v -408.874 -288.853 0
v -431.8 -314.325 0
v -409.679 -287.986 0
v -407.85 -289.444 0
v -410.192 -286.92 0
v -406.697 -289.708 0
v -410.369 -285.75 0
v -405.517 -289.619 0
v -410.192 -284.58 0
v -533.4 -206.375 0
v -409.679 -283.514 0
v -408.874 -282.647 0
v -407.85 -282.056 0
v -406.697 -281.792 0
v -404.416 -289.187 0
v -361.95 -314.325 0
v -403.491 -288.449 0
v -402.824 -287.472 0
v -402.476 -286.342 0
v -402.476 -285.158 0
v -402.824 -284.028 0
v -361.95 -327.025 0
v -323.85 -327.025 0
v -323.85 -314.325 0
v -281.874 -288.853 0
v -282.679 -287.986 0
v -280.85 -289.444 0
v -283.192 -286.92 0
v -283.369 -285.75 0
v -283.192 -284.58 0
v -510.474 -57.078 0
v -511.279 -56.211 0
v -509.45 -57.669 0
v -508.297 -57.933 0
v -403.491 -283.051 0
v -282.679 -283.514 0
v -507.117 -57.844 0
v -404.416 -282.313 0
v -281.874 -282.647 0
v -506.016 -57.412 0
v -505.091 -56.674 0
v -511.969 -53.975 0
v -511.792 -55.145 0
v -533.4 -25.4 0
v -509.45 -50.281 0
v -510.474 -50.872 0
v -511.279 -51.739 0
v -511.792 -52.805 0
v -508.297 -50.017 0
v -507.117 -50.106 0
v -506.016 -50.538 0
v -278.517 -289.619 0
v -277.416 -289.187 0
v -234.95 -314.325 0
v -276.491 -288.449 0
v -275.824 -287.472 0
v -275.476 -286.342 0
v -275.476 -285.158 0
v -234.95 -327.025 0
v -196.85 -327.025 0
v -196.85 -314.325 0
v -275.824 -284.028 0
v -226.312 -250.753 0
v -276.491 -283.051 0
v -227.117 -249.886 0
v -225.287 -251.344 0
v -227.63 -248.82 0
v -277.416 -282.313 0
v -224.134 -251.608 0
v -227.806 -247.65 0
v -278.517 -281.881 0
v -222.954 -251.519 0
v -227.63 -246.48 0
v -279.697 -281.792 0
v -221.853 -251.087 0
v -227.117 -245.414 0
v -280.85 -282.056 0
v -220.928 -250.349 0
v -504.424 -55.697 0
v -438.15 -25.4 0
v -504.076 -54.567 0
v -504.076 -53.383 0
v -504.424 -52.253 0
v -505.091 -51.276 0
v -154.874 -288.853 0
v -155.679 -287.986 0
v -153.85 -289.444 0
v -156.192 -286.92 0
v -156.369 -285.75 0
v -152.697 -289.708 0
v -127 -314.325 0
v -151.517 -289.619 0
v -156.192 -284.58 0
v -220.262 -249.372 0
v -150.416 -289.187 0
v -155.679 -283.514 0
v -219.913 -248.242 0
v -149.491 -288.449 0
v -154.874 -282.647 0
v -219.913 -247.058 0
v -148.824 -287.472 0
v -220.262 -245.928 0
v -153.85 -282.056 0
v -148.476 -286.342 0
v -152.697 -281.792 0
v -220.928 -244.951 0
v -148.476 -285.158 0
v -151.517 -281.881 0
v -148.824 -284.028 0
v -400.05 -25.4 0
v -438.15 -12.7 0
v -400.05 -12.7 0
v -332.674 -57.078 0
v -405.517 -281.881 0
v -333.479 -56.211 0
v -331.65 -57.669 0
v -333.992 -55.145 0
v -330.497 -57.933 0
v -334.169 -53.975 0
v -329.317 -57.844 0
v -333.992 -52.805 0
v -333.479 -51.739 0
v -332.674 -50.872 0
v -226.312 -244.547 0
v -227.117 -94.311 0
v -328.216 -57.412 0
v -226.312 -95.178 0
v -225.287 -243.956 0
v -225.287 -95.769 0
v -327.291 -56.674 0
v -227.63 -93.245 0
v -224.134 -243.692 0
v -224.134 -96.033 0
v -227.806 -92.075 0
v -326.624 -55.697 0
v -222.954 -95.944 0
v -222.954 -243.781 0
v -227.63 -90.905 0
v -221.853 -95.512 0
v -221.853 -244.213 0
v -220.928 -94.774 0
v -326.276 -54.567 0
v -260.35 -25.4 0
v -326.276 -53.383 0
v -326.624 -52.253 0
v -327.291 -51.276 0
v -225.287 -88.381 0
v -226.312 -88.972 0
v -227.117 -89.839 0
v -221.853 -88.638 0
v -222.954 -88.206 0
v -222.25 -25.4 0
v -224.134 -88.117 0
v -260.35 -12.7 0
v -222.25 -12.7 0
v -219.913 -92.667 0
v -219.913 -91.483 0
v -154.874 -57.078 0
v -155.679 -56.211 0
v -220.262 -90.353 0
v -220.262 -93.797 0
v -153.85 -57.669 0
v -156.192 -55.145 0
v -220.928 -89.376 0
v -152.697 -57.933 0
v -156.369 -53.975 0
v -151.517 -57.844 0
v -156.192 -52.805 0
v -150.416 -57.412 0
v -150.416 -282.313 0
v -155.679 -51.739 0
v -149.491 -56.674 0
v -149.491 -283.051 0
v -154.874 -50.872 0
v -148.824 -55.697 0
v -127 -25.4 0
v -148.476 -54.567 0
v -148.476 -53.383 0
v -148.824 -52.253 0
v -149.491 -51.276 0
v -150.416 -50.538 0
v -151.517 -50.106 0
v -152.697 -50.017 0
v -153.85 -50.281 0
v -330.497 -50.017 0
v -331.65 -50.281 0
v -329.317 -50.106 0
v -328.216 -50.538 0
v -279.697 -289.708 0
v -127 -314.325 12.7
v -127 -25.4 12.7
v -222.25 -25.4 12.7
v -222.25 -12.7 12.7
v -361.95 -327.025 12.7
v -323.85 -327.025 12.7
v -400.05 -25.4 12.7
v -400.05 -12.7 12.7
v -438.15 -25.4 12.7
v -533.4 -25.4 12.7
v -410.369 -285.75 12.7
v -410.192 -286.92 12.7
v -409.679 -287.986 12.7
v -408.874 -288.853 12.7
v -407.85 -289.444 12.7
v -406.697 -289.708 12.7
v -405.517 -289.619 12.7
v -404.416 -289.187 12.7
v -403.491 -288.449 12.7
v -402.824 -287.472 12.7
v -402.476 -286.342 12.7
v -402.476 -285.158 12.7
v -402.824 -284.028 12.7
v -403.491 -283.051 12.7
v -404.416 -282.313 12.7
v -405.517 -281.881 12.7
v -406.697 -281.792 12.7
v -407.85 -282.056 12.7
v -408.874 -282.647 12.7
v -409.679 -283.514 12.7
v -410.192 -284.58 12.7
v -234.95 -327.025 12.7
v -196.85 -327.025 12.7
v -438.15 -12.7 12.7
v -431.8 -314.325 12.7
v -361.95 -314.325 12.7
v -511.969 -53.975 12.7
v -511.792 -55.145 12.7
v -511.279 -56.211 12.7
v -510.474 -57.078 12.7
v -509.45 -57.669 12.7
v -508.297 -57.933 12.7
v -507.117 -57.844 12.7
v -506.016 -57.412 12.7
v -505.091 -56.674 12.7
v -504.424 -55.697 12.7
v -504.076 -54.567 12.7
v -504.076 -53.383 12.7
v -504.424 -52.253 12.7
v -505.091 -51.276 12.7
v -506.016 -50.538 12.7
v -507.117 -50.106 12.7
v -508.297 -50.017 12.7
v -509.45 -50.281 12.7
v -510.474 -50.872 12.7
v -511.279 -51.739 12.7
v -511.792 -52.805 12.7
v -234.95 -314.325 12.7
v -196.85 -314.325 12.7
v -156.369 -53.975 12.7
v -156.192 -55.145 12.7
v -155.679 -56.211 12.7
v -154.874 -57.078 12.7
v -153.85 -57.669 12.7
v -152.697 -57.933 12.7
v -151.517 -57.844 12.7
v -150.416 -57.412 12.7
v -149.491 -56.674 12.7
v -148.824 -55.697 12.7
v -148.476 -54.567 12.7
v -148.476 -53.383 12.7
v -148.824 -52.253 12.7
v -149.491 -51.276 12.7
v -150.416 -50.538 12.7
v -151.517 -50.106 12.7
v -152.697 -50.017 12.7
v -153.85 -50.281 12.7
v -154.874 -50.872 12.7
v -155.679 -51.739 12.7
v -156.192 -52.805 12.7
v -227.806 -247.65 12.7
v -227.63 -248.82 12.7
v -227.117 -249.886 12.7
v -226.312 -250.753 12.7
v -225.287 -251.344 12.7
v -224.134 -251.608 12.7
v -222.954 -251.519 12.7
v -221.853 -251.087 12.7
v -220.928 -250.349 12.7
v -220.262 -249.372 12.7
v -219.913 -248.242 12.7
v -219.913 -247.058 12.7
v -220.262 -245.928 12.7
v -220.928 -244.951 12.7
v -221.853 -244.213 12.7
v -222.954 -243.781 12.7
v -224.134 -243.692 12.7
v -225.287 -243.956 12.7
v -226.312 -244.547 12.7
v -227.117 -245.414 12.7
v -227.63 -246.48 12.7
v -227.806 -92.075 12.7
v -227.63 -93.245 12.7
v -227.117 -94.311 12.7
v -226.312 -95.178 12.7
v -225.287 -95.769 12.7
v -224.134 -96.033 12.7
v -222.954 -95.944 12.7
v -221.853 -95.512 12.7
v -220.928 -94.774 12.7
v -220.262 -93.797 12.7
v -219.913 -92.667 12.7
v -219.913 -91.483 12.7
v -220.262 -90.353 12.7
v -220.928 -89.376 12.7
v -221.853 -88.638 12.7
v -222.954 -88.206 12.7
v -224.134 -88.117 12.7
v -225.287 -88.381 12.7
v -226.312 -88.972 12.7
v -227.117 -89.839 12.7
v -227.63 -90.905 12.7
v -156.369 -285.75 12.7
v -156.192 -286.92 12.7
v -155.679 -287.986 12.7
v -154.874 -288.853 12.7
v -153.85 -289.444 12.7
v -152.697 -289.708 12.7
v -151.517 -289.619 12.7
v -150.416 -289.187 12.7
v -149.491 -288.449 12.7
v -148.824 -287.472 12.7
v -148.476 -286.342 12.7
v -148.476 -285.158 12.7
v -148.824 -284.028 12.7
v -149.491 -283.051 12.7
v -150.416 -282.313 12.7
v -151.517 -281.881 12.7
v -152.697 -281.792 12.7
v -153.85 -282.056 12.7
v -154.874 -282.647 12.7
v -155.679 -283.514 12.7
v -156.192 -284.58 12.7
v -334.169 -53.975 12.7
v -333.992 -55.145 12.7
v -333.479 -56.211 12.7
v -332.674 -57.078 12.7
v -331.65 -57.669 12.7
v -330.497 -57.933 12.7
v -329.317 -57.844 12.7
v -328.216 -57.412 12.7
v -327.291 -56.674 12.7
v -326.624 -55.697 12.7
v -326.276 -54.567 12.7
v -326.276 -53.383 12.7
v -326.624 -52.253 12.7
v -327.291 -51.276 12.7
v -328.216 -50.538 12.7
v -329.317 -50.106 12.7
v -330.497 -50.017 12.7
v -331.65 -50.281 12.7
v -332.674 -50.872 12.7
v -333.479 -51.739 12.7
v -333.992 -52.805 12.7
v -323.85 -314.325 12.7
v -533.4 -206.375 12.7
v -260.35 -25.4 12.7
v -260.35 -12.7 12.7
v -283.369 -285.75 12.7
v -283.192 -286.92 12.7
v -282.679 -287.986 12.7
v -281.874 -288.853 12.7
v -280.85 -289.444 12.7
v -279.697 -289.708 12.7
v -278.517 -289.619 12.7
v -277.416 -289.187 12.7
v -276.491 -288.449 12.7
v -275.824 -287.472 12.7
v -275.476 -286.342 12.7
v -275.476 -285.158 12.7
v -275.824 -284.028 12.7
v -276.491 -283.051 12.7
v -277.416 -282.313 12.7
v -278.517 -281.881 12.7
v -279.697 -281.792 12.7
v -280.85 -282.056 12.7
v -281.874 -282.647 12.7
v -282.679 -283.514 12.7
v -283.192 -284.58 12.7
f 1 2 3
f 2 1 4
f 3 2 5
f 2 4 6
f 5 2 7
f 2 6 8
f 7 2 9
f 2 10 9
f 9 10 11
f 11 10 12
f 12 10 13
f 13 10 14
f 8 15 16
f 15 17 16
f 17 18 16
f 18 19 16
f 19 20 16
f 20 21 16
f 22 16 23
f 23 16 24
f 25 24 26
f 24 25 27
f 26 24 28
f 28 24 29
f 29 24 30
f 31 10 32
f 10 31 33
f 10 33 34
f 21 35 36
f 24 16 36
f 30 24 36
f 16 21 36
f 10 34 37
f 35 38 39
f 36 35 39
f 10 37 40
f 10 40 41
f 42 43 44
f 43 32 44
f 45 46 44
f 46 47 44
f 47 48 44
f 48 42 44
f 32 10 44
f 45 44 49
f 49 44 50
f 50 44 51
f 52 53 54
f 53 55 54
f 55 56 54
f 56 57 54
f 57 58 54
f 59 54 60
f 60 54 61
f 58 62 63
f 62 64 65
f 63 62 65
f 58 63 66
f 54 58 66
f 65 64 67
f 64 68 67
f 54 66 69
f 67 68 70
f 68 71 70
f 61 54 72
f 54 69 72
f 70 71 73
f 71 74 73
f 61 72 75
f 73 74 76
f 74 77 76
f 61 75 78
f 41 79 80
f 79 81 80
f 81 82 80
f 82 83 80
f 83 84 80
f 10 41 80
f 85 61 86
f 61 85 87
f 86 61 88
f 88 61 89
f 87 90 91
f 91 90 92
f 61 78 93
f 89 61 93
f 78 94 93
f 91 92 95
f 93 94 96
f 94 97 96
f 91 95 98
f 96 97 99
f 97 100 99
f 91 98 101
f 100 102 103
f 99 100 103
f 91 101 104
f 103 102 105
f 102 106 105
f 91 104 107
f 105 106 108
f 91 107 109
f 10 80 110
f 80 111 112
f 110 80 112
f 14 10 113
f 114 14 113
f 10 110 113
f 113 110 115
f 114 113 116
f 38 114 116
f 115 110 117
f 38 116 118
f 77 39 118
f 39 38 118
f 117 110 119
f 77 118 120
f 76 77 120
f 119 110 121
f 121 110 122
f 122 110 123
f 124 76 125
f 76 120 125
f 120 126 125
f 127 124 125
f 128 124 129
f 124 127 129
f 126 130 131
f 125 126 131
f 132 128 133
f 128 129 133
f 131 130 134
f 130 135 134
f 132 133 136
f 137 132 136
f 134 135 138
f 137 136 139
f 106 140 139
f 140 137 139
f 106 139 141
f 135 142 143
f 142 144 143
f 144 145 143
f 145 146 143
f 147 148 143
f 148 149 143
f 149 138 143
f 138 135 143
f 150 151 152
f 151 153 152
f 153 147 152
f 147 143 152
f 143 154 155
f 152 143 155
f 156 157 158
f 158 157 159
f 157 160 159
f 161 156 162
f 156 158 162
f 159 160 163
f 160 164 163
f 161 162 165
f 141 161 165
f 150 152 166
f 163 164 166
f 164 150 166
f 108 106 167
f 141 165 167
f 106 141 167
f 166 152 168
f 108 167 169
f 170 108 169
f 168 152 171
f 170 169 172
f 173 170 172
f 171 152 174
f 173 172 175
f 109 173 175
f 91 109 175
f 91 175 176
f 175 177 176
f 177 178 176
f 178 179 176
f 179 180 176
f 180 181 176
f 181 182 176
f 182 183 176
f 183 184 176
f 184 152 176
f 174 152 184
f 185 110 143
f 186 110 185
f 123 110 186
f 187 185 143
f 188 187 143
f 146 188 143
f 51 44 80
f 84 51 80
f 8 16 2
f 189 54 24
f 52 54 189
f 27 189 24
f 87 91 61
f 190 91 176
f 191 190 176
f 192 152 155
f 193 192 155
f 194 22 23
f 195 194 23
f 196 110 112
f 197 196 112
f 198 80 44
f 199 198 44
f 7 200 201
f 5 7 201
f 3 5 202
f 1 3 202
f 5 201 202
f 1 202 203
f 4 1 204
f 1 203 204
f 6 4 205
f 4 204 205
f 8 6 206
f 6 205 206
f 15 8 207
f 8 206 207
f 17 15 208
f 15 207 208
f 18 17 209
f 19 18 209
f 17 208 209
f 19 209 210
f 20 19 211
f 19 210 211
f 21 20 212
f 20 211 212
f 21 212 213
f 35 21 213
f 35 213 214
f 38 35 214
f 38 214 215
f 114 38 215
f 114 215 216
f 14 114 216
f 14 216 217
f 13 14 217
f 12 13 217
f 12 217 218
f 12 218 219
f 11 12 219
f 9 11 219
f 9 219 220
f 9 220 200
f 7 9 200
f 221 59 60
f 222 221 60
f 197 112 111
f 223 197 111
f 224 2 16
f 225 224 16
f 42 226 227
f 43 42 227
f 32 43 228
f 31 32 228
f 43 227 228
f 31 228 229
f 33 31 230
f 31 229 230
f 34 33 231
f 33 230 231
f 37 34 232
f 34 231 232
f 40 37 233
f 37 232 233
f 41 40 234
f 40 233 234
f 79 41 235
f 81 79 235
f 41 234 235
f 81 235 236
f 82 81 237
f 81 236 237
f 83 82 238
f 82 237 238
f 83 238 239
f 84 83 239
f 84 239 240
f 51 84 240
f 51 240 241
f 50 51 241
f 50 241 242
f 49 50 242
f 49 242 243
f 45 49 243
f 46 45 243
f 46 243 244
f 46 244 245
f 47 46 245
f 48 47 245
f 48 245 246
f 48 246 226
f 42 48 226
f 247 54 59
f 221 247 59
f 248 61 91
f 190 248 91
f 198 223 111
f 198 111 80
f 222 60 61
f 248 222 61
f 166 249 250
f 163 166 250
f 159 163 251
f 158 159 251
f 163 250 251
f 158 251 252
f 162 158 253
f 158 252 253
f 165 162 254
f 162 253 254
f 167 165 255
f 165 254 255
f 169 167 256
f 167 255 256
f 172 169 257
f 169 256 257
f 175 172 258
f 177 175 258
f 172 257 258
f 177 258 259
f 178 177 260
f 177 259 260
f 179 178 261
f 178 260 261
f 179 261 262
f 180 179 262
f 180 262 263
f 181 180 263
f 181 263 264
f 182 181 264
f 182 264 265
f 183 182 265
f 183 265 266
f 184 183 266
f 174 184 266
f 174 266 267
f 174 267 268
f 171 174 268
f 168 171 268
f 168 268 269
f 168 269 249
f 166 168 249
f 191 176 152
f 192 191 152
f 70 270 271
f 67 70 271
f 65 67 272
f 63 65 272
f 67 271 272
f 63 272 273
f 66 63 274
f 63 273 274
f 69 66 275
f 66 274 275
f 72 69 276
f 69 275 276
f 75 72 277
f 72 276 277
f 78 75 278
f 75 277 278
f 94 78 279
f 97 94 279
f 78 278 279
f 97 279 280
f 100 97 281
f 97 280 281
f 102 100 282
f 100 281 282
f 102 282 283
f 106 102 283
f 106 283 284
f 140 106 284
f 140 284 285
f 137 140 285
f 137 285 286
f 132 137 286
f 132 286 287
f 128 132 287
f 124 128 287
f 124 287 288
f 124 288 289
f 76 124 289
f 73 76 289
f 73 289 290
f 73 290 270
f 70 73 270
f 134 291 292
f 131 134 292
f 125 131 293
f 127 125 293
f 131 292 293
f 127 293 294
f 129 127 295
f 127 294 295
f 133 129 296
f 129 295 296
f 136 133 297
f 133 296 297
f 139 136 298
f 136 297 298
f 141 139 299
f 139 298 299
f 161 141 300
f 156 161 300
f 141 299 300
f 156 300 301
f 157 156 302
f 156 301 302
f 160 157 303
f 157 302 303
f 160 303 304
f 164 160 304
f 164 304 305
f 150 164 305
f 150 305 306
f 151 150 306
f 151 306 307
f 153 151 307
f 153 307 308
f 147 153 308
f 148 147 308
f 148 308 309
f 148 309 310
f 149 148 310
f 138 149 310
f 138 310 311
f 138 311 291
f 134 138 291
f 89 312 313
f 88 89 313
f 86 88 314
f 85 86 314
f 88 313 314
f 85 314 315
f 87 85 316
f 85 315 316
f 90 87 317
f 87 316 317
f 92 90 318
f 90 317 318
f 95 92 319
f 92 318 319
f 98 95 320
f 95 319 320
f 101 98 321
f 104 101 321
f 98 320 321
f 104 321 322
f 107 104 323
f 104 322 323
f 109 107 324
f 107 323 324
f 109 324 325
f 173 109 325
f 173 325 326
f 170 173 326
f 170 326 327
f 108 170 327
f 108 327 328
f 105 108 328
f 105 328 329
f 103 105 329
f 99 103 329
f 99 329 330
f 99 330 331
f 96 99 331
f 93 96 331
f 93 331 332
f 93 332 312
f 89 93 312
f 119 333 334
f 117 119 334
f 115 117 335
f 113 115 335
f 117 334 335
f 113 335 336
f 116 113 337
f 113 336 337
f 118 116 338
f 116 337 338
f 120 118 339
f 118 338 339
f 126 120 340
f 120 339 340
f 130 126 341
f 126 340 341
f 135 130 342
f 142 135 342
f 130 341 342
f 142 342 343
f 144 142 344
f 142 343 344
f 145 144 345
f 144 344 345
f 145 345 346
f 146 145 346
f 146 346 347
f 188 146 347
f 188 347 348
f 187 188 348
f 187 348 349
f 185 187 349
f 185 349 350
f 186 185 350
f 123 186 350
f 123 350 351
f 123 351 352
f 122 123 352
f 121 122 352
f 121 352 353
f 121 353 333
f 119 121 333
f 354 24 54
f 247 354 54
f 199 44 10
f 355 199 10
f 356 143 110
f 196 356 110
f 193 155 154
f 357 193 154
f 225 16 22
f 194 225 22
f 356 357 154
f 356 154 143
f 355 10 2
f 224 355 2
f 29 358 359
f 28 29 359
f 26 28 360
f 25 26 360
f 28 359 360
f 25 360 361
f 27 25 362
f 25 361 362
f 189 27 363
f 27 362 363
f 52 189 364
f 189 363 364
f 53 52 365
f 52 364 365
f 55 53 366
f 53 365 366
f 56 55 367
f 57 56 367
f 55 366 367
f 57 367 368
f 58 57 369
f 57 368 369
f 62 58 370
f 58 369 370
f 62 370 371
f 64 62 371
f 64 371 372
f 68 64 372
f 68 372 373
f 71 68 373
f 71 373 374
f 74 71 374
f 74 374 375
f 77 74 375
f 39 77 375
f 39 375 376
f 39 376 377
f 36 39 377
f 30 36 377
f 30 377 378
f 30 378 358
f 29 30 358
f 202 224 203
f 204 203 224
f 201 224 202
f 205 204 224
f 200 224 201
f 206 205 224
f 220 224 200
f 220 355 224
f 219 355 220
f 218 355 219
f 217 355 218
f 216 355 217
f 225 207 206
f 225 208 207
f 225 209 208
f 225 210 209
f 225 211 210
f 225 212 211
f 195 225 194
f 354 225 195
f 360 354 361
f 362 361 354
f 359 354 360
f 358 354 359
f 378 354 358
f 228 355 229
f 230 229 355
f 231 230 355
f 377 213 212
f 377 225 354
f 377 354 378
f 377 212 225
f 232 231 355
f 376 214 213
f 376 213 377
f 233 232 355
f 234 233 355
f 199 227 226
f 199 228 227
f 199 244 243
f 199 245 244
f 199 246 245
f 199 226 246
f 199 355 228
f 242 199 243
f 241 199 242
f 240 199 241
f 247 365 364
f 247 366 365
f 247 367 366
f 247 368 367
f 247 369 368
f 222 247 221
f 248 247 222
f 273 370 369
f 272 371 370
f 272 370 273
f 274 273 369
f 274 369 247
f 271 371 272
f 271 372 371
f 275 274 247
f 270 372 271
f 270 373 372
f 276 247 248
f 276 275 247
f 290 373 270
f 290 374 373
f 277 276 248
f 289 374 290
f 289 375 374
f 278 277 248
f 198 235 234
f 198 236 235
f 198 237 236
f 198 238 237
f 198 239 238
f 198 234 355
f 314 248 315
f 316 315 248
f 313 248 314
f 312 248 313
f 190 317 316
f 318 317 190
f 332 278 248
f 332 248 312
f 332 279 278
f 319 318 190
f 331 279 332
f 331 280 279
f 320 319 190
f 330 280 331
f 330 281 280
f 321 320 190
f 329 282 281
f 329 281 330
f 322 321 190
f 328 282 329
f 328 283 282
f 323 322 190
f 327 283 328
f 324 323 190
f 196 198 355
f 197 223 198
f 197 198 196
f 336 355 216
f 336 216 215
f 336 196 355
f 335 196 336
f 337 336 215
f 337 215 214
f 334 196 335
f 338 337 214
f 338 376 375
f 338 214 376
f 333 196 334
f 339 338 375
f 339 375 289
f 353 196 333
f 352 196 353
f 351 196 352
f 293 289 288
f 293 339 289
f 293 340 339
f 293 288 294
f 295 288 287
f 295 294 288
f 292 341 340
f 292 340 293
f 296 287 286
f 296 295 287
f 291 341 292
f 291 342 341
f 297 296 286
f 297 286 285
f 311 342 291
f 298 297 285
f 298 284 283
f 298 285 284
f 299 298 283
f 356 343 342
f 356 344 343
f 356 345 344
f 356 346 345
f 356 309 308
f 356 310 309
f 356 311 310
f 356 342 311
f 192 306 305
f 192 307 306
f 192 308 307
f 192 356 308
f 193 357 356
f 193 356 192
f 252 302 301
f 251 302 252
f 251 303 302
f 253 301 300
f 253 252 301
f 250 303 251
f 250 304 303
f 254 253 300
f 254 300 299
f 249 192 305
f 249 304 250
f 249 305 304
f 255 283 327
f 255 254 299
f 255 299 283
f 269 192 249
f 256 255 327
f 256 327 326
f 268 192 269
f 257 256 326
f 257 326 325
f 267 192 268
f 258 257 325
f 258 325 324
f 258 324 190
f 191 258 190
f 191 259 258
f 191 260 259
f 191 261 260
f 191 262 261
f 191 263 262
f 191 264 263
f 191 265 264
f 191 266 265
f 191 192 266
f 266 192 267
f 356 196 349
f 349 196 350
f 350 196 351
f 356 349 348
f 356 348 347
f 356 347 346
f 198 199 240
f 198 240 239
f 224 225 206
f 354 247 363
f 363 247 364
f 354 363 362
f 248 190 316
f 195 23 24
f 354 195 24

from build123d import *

# Parameters (mm, degrees)
F1_DEPTH = 12.7
F2_D     = 7.9375
F2_DEPTH = 17.4752
F2_TIP   = 2.3846655818


with BuildPart() as f1:
    # F0 (on Top) → F1 (new body)
    with BuildSketch(Plane.XY):
        Polygon((-127, -314.325), (-127, -25.4), (-222.25, -25.4), (-222.25, -12.7), (-260.35, -12.7), (-260.35, -25.4), (-400.05, -25.4), (-400.05, -12.7), (-438.15, -12.7), (-438.15, -25.4), (-533.4, -25.4), (-533.4, -206.375), (-431.8, -314.325), (-361.95, -314.325), (-361.95, -327.025), (-323.85, -327.025), (-323.85, -314.325), (-234.95, -314.325), (-234.95, -327.025), (-196.85, -327.025), (-196.85, -314.325), align=None)
    extrude(amount=F1_DEPTH)

    # F2
    with Locations(Plane(origin=(0, 0, 0), x_dir=(1, 0, 0), z_dir=(0, 0, -1))):
        with Locations((-406.4, 285.75), (-223.8375, 247.65), (-152.4, 285.75), (-279.4, 285.75), (-223.8375, 92.075), (-152.4, 53.975), (-330.2, 53.975), (-508, 53.975)):
            Hole(F2_D / 2, depth=F2_DEPTH)
            with Locations((0, 0, -(F2_DEPTH + F2_TIP / 2))):  # 118° drill point
                Cone(0, F2_D / 2, F2_TIP, mode=Mode.SUBTRACT)


solid = f1.part
